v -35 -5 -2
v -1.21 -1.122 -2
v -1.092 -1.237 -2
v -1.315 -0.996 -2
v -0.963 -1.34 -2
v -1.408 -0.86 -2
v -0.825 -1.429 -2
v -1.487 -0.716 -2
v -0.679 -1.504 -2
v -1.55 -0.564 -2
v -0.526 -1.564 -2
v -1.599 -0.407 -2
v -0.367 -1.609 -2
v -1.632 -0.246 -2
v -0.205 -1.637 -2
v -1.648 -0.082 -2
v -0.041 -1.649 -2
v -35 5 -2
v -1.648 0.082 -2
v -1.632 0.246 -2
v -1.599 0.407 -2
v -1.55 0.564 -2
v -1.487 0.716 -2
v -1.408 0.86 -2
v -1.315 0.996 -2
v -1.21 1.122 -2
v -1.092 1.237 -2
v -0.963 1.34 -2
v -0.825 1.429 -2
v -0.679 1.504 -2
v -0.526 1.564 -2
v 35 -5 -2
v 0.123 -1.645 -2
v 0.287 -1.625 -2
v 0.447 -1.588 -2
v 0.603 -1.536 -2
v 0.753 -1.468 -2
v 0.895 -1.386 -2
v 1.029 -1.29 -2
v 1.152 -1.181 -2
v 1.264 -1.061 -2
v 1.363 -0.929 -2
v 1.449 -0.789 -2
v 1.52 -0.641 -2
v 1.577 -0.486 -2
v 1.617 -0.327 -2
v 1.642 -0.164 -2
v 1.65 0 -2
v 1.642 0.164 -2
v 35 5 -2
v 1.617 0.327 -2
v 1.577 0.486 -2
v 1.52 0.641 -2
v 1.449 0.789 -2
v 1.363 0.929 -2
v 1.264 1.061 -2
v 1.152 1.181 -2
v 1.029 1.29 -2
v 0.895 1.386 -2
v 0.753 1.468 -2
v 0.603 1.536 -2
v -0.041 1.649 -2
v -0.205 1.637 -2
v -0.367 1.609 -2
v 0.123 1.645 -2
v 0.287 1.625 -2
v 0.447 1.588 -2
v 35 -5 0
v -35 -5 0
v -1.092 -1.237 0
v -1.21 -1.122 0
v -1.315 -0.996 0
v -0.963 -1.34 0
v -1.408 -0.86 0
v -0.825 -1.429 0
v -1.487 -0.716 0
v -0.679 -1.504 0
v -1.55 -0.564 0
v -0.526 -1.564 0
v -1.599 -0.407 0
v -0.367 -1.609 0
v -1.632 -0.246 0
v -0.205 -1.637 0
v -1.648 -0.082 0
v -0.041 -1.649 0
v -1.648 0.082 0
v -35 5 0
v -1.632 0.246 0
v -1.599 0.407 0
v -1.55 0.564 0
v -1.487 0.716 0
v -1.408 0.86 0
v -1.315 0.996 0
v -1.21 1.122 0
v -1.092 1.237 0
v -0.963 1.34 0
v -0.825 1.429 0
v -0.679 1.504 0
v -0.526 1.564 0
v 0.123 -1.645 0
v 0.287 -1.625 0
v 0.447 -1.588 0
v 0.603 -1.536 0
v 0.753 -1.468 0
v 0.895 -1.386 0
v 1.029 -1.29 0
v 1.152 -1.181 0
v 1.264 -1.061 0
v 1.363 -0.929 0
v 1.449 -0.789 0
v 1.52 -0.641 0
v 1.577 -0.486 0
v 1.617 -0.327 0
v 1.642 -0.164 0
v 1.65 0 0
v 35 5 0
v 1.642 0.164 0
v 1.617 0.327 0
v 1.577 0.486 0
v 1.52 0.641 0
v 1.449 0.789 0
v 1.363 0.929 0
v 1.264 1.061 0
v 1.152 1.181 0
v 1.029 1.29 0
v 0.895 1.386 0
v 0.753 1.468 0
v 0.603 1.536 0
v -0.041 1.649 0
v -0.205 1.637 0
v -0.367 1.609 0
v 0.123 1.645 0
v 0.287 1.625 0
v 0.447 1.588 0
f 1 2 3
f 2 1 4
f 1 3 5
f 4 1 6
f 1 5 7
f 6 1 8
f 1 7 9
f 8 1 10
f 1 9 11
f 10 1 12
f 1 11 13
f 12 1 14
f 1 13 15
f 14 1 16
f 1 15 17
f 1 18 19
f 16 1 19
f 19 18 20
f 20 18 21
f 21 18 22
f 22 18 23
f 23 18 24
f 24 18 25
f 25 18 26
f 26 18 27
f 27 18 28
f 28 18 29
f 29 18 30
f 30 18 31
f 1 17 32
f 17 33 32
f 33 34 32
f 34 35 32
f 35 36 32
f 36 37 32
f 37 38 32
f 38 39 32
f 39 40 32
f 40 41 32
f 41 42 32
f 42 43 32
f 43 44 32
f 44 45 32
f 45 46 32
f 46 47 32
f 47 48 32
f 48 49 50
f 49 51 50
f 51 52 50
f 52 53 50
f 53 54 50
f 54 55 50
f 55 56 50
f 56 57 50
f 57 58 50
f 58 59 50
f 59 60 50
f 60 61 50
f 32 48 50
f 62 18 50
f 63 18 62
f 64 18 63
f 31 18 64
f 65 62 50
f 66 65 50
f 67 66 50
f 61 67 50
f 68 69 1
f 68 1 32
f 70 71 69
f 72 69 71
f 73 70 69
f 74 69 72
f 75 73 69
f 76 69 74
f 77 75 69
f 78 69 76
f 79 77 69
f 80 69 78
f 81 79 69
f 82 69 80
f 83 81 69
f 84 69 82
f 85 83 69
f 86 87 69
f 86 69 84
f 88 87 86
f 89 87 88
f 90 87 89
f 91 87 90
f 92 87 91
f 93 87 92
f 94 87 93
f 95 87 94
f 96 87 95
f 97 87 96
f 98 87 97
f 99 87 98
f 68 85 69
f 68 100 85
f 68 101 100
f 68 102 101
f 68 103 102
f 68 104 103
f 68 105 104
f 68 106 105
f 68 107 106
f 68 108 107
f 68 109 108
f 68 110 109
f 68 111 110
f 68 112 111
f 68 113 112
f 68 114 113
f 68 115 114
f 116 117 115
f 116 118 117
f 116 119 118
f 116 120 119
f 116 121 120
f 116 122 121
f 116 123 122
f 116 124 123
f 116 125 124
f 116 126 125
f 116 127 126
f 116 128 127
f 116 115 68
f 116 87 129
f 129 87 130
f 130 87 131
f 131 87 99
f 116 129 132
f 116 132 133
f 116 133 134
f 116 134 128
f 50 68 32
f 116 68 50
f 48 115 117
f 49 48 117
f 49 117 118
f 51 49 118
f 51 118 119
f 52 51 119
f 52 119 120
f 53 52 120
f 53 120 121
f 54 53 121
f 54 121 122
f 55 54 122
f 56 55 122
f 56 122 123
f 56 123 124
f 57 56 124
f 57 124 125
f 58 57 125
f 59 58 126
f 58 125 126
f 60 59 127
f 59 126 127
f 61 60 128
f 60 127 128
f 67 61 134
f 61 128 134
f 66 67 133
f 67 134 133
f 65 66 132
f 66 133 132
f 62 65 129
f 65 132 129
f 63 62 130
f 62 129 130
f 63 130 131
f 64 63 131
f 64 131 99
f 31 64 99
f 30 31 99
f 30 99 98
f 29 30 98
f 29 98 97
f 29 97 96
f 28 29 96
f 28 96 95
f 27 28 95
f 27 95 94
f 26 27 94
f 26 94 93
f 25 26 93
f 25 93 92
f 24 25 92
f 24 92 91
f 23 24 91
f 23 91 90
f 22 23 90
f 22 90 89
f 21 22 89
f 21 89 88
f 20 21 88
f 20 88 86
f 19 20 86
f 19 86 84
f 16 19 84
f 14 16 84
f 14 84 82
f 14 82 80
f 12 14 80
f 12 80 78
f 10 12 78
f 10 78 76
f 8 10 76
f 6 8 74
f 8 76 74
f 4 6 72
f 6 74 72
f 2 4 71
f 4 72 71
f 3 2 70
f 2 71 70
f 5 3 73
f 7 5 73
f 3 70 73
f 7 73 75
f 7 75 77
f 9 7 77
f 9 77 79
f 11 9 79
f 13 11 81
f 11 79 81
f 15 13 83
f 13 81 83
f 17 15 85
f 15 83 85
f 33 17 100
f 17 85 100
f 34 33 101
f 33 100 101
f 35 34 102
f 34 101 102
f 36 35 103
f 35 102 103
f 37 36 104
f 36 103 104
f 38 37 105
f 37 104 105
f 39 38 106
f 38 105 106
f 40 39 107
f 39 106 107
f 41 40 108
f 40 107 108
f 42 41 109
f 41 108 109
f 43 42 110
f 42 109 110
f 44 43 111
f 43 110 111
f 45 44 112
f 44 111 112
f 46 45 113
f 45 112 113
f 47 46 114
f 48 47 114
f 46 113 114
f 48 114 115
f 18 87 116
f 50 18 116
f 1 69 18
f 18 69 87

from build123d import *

# Parameters (mm, degrees)
ESBO_O1_W                                      = 70
ESBO_O1_H                                      = 10
FLANGE_BASE1_DEPTH                             = 2
BROCA_DE_ROSQUEAR_DE_CANO_PARA_TARRAXA_D_D     = 3.3
BROCA_DE_ROSQUEAR_DE_CANO_PARA_TARRAXA_D_DEPTH = 4
BROCA_DE_ROSQUEAR_DE_CANO_PARA_TARRAXA_D_TIP   = 0.991420021


# Sheet-metal steps are written as plain solids
with BuildPart() as part:
    # Esboço1 → Flange-base1 (new body)
    with BuildSketch(Plane.XY):
        Rectangle(ESBO_O1_W, ESBO_O1_H)
    extrude(amount=-FLANGE_BASE1_DEPTH)

    # Broca de rosquear de cano para tarraxa de 1/81
    with Locations(Plane(origin=(0, 0, -2), x_dir=(-1, 0, 0), z_dir=(0, 0, -1))):
        with Locations((0, 0)):
            Hole(BROCA_DE_ROSQUEAR_DE_CANO_PARA_TARRAXA_D_D / 2, depth=BROCA_DE_ROSQUEAR_DE_CANO_PARA_TARRAXA_D_DEPTH)
            with Locations((0, 0, -(BROCA_DE_ROSQUEAR_DE_CANO_PARA_TARRAXA_D_DEPTH + BROCA_DE_ROSQUEAR_DE_CANO_PARA_TARRAXA_D_TIP / 2))):  # 118° drill point
                Cone(0, BROCA_DE_ROSQUEAR_DE_CANO_PARA_TARRAXA_D_D / 2, BROCA_DE_ROSQUEAR_DE_CANO_PARA_TARRAXA_D_TIP, mode=Mode.SUBTRACT)


solid = part.part
